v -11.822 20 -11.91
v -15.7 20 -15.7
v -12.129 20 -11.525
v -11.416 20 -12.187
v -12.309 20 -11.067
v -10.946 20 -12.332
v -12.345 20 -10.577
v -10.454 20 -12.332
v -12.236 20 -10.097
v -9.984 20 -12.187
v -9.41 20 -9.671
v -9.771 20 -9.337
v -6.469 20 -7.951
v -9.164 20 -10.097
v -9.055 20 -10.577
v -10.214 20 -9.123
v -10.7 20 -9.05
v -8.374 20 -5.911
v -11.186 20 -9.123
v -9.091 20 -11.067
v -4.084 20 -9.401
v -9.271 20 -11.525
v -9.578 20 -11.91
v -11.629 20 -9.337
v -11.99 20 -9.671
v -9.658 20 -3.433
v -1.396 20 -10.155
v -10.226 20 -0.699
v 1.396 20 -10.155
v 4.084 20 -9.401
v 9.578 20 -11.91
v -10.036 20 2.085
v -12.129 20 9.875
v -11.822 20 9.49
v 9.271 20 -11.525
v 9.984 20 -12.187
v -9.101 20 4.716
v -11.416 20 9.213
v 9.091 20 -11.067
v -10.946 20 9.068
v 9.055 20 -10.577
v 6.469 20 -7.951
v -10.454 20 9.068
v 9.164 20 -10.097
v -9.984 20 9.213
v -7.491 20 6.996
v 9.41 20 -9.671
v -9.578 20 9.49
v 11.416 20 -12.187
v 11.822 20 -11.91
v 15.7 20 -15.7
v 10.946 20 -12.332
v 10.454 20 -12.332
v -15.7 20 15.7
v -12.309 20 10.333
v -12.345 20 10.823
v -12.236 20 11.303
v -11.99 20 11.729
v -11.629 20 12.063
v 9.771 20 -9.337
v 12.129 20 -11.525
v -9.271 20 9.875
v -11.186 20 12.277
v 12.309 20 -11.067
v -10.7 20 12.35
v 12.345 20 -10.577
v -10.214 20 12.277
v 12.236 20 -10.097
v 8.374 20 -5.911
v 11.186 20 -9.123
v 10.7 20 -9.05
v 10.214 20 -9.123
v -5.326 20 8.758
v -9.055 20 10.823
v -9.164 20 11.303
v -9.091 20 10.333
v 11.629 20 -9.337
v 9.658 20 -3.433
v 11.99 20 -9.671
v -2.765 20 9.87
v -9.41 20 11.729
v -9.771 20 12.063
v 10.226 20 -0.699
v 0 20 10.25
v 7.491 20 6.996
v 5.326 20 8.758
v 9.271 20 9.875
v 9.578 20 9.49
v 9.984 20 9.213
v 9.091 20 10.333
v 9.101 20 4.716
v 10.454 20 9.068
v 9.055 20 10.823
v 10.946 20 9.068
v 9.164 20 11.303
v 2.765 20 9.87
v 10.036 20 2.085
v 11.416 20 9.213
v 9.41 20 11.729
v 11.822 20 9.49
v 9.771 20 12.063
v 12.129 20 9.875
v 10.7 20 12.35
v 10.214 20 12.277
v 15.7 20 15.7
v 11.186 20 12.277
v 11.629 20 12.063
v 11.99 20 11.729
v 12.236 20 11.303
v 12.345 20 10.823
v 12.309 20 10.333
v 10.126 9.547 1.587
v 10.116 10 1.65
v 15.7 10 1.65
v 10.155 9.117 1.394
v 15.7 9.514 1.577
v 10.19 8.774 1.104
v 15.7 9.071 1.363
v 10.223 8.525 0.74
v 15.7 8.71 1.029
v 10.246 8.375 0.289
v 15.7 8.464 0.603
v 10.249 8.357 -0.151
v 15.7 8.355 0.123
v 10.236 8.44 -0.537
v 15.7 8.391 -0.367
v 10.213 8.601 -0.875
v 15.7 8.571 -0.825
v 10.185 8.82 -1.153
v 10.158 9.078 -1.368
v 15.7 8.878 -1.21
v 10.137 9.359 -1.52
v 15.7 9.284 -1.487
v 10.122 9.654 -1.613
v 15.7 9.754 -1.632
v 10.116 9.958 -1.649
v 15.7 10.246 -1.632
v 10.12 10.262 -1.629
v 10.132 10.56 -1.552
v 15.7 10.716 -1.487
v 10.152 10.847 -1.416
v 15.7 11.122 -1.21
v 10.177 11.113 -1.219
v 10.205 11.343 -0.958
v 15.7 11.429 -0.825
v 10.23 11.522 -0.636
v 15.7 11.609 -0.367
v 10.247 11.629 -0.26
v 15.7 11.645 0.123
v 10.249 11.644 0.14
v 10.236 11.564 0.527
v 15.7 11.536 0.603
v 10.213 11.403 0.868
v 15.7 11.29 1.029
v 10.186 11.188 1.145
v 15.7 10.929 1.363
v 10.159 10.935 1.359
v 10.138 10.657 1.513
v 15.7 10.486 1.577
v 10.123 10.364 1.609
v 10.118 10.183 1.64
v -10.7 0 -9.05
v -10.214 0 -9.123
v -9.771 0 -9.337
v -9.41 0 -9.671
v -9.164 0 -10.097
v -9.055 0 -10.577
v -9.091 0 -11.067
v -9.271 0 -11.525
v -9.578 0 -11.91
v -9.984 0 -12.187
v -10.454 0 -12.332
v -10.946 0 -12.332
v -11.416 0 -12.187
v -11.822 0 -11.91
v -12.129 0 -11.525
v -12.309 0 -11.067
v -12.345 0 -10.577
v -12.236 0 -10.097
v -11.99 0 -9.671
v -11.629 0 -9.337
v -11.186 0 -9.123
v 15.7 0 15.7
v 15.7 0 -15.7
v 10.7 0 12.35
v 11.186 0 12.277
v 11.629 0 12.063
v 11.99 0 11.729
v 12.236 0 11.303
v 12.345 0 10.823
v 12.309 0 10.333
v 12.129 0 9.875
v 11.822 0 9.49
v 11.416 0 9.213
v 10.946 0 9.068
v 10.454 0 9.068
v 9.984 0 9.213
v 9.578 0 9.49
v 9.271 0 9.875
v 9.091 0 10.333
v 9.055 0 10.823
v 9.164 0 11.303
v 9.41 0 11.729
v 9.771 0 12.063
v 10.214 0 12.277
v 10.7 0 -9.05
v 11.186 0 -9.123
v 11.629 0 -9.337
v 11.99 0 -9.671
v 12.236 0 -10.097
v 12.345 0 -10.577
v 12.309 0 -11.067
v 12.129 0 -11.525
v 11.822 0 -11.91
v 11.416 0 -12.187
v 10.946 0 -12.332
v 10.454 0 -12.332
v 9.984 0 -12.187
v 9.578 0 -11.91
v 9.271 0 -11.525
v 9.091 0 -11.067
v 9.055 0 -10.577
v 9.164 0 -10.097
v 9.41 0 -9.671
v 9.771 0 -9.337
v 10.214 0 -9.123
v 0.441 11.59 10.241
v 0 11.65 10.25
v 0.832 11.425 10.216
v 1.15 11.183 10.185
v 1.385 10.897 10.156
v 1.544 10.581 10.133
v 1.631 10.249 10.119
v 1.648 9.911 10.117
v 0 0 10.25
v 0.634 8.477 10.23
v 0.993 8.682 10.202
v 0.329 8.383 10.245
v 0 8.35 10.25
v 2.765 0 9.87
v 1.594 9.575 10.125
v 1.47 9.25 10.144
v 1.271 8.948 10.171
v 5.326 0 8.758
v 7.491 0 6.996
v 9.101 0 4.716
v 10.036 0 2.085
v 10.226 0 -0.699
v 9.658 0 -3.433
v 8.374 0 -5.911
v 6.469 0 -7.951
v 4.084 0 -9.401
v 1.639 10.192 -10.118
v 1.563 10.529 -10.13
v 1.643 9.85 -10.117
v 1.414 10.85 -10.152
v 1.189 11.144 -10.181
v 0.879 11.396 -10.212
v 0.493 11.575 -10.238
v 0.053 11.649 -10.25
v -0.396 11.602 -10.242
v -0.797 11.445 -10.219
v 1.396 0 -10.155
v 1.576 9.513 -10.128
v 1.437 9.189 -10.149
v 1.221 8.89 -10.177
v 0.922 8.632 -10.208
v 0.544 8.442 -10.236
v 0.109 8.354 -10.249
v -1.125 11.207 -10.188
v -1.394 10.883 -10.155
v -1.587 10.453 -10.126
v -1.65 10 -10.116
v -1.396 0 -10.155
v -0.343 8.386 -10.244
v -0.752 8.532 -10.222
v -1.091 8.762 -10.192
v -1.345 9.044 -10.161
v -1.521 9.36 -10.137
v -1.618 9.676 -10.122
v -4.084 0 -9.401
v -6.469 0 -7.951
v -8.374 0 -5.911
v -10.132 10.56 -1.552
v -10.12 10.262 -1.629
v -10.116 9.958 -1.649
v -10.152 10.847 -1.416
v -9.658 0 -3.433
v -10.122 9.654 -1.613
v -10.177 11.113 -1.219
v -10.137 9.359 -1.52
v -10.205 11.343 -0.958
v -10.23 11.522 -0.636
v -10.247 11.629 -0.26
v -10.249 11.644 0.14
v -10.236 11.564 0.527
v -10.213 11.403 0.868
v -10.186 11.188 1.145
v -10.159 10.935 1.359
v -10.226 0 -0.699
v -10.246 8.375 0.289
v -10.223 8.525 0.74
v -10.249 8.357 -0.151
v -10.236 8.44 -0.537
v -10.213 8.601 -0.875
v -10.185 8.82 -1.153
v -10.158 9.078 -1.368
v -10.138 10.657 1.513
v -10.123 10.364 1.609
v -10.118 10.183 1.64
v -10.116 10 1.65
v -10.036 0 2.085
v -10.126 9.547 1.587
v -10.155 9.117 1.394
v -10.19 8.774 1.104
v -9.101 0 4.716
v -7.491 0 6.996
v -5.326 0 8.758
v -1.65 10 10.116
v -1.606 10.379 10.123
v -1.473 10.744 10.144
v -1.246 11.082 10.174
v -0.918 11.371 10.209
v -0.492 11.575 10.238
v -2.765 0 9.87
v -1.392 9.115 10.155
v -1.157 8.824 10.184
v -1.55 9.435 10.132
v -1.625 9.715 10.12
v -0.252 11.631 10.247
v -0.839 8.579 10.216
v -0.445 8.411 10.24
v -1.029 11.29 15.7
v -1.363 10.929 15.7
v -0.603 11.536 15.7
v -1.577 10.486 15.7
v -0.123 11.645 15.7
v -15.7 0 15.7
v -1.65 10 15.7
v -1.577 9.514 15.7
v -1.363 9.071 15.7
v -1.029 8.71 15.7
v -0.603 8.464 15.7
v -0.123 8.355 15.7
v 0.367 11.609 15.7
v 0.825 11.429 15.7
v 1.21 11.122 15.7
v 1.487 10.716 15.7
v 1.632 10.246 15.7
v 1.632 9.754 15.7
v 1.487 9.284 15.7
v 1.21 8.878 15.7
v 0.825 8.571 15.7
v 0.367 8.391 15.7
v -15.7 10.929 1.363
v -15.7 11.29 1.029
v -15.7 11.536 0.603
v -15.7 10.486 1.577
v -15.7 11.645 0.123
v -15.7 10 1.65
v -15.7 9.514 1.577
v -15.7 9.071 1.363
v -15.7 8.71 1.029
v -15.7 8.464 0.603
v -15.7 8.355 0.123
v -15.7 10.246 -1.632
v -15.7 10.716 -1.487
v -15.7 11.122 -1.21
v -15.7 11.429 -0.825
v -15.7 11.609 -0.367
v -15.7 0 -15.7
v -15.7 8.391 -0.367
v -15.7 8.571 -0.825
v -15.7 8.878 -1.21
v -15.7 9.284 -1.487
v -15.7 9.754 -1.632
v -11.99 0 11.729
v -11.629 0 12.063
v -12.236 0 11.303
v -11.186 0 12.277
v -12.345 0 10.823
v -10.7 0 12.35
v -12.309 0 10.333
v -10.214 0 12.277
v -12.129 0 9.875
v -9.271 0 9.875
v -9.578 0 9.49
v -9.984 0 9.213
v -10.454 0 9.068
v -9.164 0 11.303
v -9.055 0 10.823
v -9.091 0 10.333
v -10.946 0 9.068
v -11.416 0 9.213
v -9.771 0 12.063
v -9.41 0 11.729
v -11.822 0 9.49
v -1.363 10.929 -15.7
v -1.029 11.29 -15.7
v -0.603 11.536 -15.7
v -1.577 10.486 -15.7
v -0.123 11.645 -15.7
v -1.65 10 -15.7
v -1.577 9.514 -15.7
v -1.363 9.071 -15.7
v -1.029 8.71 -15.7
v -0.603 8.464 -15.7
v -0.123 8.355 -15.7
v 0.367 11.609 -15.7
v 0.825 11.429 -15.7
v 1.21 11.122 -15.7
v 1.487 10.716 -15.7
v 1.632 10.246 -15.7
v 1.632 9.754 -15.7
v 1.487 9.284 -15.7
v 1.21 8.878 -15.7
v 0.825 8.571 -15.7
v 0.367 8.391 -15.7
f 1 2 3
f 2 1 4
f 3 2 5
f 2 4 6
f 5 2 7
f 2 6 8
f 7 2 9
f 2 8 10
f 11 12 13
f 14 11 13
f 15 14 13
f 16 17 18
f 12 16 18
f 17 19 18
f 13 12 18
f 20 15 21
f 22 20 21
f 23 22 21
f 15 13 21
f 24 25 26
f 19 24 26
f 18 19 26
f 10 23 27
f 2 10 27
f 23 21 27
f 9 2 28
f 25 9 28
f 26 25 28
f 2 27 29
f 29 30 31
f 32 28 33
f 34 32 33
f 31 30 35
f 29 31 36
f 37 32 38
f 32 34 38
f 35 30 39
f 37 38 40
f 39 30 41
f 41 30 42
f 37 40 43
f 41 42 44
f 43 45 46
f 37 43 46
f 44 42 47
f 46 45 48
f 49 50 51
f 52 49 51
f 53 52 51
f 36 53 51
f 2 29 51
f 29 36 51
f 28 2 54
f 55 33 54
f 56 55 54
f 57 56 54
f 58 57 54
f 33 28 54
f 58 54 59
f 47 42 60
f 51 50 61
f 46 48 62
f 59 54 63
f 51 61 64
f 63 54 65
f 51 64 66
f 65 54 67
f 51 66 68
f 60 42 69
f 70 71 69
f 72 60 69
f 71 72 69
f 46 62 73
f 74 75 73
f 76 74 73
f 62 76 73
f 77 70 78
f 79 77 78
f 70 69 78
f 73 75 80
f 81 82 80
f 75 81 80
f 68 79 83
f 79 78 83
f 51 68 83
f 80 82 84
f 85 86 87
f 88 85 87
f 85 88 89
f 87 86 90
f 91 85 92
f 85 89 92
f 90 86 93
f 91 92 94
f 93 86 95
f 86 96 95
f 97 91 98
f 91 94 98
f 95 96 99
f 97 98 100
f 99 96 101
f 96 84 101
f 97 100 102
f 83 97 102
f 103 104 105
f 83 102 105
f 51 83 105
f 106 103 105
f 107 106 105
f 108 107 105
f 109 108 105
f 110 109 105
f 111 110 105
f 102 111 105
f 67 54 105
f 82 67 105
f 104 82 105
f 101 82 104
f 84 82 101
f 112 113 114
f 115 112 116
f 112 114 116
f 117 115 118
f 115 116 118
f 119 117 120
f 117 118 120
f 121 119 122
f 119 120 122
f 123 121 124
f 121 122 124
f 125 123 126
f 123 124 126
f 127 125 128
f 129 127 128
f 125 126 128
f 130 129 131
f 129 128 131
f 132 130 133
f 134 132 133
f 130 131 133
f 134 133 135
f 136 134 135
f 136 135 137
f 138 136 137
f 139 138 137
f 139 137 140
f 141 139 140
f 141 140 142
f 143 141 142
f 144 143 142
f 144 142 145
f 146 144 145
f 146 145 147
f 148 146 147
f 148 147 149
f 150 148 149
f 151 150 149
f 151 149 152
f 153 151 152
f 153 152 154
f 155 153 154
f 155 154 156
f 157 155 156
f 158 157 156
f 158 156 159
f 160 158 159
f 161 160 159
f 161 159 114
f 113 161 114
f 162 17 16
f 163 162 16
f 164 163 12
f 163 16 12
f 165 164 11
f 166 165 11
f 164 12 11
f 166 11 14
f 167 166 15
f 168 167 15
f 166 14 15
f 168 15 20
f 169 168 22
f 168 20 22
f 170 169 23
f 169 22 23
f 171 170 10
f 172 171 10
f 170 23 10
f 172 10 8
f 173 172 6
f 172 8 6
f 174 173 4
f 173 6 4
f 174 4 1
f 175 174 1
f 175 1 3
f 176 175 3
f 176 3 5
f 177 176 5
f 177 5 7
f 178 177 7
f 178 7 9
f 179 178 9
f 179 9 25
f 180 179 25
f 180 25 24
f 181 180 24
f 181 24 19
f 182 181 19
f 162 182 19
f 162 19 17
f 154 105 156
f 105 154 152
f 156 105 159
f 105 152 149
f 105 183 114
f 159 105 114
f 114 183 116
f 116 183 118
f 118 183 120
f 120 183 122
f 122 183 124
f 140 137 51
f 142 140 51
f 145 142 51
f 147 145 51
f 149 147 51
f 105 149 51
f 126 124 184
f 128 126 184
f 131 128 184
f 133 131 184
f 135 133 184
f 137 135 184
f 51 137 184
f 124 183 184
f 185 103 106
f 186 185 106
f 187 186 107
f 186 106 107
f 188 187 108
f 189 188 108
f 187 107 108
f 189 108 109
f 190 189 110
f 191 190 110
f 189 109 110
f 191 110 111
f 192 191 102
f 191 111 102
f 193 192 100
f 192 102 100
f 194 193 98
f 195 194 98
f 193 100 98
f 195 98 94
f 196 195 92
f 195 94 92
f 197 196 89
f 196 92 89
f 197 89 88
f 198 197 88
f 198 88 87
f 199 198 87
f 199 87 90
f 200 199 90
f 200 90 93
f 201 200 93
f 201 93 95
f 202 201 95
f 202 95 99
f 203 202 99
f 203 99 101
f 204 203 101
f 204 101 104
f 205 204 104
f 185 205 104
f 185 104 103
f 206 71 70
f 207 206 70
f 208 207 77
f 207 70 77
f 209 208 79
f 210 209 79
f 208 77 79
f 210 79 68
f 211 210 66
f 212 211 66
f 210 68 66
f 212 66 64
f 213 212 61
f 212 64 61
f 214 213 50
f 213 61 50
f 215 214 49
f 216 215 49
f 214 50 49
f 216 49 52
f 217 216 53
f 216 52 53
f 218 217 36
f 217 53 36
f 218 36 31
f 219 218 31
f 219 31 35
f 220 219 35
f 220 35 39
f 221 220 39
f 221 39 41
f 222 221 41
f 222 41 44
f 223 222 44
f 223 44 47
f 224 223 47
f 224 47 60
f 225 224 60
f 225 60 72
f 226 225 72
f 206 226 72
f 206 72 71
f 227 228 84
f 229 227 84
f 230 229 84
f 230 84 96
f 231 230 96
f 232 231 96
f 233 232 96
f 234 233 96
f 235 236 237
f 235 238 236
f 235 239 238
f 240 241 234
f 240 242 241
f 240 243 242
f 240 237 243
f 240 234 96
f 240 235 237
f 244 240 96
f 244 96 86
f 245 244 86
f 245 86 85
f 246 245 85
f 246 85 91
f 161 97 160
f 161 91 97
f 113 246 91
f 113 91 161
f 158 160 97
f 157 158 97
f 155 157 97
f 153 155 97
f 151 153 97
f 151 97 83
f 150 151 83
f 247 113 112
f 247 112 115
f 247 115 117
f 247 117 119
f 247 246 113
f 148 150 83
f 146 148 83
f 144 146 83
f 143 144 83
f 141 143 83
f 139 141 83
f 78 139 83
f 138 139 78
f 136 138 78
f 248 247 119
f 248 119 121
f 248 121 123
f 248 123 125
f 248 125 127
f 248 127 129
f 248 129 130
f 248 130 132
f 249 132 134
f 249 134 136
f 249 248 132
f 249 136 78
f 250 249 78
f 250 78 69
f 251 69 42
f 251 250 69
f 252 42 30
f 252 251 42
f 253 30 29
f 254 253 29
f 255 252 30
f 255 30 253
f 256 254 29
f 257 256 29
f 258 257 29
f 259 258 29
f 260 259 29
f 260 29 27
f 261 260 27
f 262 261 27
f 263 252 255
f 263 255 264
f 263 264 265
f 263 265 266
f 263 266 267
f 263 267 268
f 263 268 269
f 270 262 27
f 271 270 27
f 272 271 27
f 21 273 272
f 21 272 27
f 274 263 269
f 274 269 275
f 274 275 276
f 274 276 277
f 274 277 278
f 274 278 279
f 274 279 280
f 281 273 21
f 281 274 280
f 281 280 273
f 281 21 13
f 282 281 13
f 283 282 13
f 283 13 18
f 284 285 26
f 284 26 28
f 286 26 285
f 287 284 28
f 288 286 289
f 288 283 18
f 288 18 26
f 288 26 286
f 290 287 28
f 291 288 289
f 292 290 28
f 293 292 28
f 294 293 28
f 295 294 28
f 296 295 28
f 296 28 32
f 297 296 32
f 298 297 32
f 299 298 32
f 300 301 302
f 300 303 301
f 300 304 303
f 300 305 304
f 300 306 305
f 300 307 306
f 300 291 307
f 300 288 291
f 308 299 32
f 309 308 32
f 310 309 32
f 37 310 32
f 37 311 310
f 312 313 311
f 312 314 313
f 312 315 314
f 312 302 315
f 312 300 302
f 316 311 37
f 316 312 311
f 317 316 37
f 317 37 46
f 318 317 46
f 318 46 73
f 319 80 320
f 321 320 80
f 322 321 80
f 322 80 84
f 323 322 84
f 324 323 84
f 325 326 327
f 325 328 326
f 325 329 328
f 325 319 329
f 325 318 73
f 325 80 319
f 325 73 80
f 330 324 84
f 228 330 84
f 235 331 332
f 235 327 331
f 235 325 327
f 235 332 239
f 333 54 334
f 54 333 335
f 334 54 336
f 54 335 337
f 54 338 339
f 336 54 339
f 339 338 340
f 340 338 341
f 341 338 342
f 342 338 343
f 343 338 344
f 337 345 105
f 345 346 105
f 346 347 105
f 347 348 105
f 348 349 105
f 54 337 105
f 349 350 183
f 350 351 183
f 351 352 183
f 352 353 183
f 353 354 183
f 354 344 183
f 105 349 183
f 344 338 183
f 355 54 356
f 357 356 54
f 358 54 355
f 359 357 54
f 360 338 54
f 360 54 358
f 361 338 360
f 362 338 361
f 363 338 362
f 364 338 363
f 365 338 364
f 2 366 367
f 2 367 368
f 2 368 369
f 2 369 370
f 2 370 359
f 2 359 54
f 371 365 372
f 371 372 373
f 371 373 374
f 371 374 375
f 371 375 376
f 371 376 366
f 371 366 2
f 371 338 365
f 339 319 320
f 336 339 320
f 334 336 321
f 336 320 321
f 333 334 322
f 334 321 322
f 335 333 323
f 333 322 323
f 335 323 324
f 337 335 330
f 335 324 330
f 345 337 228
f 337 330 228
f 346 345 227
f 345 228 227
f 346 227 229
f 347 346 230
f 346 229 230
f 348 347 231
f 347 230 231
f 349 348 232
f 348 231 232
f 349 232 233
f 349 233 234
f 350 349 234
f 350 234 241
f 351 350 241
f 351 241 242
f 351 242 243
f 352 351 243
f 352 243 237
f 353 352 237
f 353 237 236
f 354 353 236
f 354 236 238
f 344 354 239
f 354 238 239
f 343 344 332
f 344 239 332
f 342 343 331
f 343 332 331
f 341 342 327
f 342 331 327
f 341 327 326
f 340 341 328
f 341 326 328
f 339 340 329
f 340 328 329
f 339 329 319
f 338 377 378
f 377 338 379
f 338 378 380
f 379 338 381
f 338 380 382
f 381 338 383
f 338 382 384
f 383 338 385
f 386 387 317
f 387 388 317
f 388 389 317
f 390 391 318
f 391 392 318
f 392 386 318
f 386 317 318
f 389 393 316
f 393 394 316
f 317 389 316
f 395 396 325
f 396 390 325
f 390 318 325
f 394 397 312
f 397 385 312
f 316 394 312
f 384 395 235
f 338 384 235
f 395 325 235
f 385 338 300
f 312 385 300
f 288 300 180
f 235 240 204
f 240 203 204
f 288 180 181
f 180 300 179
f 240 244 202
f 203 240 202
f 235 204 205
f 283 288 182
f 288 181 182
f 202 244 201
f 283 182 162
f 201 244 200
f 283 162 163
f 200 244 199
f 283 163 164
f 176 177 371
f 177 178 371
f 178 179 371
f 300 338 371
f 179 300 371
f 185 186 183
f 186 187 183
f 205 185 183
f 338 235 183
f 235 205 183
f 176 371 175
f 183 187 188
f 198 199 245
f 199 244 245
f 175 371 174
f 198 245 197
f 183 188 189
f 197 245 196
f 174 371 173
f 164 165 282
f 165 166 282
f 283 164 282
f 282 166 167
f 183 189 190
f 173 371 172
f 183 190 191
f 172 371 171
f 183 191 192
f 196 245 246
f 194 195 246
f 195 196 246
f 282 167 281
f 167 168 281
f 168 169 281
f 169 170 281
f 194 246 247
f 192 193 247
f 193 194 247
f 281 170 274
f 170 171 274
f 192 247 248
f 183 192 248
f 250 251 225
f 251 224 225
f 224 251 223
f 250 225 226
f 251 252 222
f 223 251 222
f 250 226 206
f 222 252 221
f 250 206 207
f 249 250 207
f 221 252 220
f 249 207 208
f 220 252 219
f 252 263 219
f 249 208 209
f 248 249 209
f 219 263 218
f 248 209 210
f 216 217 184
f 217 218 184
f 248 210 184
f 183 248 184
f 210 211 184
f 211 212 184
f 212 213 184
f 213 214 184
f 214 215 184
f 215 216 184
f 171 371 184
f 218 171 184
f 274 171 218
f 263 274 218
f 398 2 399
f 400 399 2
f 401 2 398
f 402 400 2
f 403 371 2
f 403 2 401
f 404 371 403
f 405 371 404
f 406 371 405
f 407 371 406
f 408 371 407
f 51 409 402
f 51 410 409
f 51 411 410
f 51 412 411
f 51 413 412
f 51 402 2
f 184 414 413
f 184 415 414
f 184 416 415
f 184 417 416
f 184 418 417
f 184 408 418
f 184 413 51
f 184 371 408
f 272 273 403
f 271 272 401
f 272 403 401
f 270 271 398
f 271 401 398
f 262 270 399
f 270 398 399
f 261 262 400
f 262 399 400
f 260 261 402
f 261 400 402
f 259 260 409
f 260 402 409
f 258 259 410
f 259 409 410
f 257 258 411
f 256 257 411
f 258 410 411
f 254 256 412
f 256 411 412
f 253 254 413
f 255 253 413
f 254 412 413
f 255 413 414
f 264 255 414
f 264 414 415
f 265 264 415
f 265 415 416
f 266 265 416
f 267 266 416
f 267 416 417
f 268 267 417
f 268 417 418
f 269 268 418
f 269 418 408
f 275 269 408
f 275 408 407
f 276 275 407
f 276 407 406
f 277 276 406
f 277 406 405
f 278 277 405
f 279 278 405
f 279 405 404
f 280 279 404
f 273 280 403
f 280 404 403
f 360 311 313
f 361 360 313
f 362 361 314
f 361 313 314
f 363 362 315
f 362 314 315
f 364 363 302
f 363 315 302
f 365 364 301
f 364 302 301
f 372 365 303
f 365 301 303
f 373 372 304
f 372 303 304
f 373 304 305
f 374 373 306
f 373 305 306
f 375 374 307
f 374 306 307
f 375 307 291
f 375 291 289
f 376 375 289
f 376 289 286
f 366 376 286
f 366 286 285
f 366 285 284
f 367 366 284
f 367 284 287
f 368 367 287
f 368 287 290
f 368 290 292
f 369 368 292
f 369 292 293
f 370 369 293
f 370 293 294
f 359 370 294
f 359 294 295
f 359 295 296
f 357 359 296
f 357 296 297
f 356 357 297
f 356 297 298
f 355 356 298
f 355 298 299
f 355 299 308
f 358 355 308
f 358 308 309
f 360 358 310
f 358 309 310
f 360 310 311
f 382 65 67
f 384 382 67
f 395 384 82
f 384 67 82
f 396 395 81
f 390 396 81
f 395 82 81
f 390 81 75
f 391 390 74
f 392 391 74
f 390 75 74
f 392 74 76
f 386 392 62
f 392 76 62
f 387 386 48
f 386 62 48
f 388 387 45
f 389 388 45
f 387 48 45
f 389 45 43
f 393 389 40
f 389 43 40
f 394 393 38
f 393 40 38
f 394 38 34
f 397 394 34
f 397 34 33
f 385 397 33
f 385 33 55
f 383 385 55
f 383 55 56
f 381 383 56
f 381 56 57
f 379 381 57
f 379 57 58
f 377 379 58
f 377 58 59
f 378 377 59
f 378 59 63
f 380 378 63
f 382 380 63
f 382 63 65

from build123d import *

# Parameters (mm, degrees)
SKETCH1_W                       = 31.4
SKETCH1_H                       = 31.4
SKETCH1_R                       = 10.25
BOSS_EXTRUDE1_DEPTH             = 40
SKETCH2_R                       = 1.5
CUT_EXTRUDE1_DEPTH              = 40
M4_TAPPED_HOLE1_D               = 3.3
M4_TAPPED_HOLE1_DEPTH           = 10.1
M4_TAPPED_HOLE1_TIP             = 0.991420021
M4_TAPPED_HOLE1_ON_FACE_2_D     = 3.3
M4_TAPPED_HOLE1_ON_FACE_2_DEPTH = 10.1
M4_TAPPED_HOLE1_ON_FACE_2_TIP   = 0.991420021
SKETCH5_R                       = 1.5
CUT_EXTRUDE2_DEPTH              = 40
M4_TAPPED_HOLE2_D               = 3.3
M4_TAPPED_HOLE2_DEPTH           = 10.1
M4_TAPPED_HOLE2_TIP             = 0.991420021
M4_TAPPED_HOLE2_ON_FACE_2_D     = 3.3
M4_TAPPED_HOLE2_ON_FACE_2_DEPTH = 10.1
M4_TAPPED_HOLE2_ON_FACE_2_TIP   = 0.991420021
SKETCH8_R                       = 1.5
CUT_EXTRUDE3_DEPTH              = 30
M4_TAPPED_HOLE3_D               = 3.3
M4_TAPPED_HOLE3_DEPTH           = 52.1
M4_TAPPED_HOLE3_TIP             = 0.991420021
SKETCH10_W                      = 31.4
SKETCH10_H                      = 20
CUT_EXTRUDE4_DEPTH              = 54.220766787


with BuildPart() as part:
    # Sketch1 → Boss-Extrude1 (new body)
    with BuildSketch(Plane(origin=(0, 0, 0), x_dir=(1, 0, 0), z_dir=(0, 1, 0))):
        Rectangle(SKETCH1_W, SKETCH1_H)
        with Locations(Location((0, 0, 0), (0, 0, 270))):
            Circle(SKETCH1_R, mode=Mode.SUBTRACT)
    extrude(amount=BOSS_EXTRUDE1_DEPTH)

    # Sketch2 → Cut-Extrude1 (cut)
    with BuildSketch(Plane(origin=(15.7, 0, 0), x_dir=(0, 0, -1), z_dir=(1, 0, 0))):
        with Locations((0, 30)):
            Circle(SKETCH2_R)
        with Locations((0, 10)):
            Circle(SKETCH2_R)
    extrude(amount=-CUT_EXTRUDE1_DEPTH, mode=Mode.SUBTRACT)

    # M4 Tapped Hole1
    with Locations(Plane(origin=(-15.7, 10, 0), x_dir=(0, 0, -1), z_dir=(-1, 0, 0))):
        with Locations((0, 0), (0, -20)):
            Hole(M4_TAPPED_HOLE1_D / 2, depth=M4_TAPPED_HOLE1_DEPTH)
            with Locations((0, 0, -(M4_TAPPED_HOLE1_DEPTH + M4_TAPPED_HOLE1_TIP / 2))):  # 118° drill point
                Cone(0, M4_TAPPED_HOLE1_D / 2, M4_TAPPED_HOLE1_TIP, mode=Mode.SUBTRACT)

    # M4 Tapped Hole1 on face 2
    with Locations(Plane(origin=(15.7, 30, 0), x_dir=(0, 0, -1), z_dir=(-1, 0, 0))):
        with Locations((0, 0), (0, 20)):
            Hole(M4_TAPPED_HOLE1_ON_FACE_2_D / 2, depth=M4_TAPPED_HOLE1_ON_FACE_2_DEPTH)
            with Locations((0, 0, -(M4_TAPPED_HOLE1_ON_FACE_2_DEPTH + M4_TAPPED_HOLE1_ON_FACE_2_TIP / 2))):  # 118° drill point
                Cone(0, M4_TAPPED_HOLE1_ON_FACE_2_D / 2, M4_TAPPED_HOLE1_ON_FACE_2_TIP, mode=Mode.SUBTRACT)

    # Sketch5 → Cut-Extrude2 (cut)
    with BuildSketch(Plane.XY.offset(15.7)):
        with Locations((0, 30)):
            Circle(SKETCH5_R)
        with Locations((0, 10)):
            Circle(SKETCH5_R)
    extrude(amount=-CUT_EXTRUDE2_DEPTH, mode=Mode.SUBTRACT)

    # M4 Tapped Hole2
    with Locations(Plane(origin=(0, 30, 15.7), x_dir=(1, 0, 0), z_dir=(0, 0, 1))):
        with Locations((0, 0), (0, -20)):
            Hole(M4_TAPPED_HOLE2_D / 2, depth=M4_TAPPED_HOLE2_DEPTH)
            with Locations((0, 0, -(M4_TAPPED_HOLE2_DEPTH + M4_TAPPED_HOLE2_TIP / 2))):  # 118° drill point
                Cone(0, M4_TAPPED_HOLE2_D / 2, M4_TAPPED_HOLE2_TIP, mode=Mode.SUBTRACT)

    # M4 Tapped Hole2 on face 2
    with Locations(Plane(origin=(0, 30, -15.7), x_dir=(1, 0, 0), z_dir=(0, 0, 1))):
        with Locations((0, 0), (0, -20)):
            Hole(M4_TAPPED_HOLE2_ON_FACE_2_D / 2, depth=M4_TAPPED_HOLE2_ON_FACE_2_DEPTH)
            with Locations((0, 0, -(M4_TAPPED_HOLE2_ON_FACE_2_DEPTH + M4_TAPPED_HOLE2_ON_FACE_2_TIP / 2))):  # 118° drill point
                Cone(0, M4_TAPPED_HOLE2_ON_FACE_2_D / 2, M4_TAPPED_HOLE2_ON_FACE_2_TIP, mode=Mode.SUBTRACT)

    # Sketch8 → Cut-Extrude3 (cut)
    with BuildSketch(Plane.XZ):
        with Locations(Location((-10.7, 10.7, 0), (0, 0, 270))):
            Circle(SKETCH8_R)
        with Locations(Location((10.7, 10.7, 0), (0, 0, 90))):
            Circle(SKETCH8_R)
        with Locations(Location((10.7, -10.7, 0), (0, 0, 270))):
            Circle(SKETCH8_R)
        with Locations(Location((-10.7, -10.7, 0), (0, 0, 90))):
            Circle(SKETCH8_R)
    extrude(amount=-CUT_EXTRUDE3_DEPTH, mode=Mode.SUBTRACT)

    # M4 Tapped Hole3
    with Locations(Plane(origin=(-10.7, 0, 10.7), x_dir=(0, 0, -1), z_dir=(0, -1, 0))):
        with Locations((0, 0), (0, 21.4), (21.4, 21.4), (21.4, 0)):
            Hole(M4_TAPPED_HOLE3_D / 2, depth=M4_TAPPED_HOLE3_DEPTH)
            with Locations((0, 0, -(M4_TAPPED_HOLE3_DEPTH + M4_TAPPED_HOLE3_TIP / 2))):  # 118° drill point
                Cone(0, M4_TAPPED_HOLE3_D / 2, M4_TAPPED_HOLE3_TIP, mode=Mode.SUBTRACT)

    # Sketch10 → Cut-Extrude4 (cut, through all)
    with BuildSketch(Plane.XY.offset(15.7)):
        with Locations((0, 30)):
            Rectangle(SKETCH10_W, SKETCH10_H)
    extrude(amount=-CUT_EXTRUDE4_DEPTH, mode=Mode.SUBTRACT)


solid = part.part
